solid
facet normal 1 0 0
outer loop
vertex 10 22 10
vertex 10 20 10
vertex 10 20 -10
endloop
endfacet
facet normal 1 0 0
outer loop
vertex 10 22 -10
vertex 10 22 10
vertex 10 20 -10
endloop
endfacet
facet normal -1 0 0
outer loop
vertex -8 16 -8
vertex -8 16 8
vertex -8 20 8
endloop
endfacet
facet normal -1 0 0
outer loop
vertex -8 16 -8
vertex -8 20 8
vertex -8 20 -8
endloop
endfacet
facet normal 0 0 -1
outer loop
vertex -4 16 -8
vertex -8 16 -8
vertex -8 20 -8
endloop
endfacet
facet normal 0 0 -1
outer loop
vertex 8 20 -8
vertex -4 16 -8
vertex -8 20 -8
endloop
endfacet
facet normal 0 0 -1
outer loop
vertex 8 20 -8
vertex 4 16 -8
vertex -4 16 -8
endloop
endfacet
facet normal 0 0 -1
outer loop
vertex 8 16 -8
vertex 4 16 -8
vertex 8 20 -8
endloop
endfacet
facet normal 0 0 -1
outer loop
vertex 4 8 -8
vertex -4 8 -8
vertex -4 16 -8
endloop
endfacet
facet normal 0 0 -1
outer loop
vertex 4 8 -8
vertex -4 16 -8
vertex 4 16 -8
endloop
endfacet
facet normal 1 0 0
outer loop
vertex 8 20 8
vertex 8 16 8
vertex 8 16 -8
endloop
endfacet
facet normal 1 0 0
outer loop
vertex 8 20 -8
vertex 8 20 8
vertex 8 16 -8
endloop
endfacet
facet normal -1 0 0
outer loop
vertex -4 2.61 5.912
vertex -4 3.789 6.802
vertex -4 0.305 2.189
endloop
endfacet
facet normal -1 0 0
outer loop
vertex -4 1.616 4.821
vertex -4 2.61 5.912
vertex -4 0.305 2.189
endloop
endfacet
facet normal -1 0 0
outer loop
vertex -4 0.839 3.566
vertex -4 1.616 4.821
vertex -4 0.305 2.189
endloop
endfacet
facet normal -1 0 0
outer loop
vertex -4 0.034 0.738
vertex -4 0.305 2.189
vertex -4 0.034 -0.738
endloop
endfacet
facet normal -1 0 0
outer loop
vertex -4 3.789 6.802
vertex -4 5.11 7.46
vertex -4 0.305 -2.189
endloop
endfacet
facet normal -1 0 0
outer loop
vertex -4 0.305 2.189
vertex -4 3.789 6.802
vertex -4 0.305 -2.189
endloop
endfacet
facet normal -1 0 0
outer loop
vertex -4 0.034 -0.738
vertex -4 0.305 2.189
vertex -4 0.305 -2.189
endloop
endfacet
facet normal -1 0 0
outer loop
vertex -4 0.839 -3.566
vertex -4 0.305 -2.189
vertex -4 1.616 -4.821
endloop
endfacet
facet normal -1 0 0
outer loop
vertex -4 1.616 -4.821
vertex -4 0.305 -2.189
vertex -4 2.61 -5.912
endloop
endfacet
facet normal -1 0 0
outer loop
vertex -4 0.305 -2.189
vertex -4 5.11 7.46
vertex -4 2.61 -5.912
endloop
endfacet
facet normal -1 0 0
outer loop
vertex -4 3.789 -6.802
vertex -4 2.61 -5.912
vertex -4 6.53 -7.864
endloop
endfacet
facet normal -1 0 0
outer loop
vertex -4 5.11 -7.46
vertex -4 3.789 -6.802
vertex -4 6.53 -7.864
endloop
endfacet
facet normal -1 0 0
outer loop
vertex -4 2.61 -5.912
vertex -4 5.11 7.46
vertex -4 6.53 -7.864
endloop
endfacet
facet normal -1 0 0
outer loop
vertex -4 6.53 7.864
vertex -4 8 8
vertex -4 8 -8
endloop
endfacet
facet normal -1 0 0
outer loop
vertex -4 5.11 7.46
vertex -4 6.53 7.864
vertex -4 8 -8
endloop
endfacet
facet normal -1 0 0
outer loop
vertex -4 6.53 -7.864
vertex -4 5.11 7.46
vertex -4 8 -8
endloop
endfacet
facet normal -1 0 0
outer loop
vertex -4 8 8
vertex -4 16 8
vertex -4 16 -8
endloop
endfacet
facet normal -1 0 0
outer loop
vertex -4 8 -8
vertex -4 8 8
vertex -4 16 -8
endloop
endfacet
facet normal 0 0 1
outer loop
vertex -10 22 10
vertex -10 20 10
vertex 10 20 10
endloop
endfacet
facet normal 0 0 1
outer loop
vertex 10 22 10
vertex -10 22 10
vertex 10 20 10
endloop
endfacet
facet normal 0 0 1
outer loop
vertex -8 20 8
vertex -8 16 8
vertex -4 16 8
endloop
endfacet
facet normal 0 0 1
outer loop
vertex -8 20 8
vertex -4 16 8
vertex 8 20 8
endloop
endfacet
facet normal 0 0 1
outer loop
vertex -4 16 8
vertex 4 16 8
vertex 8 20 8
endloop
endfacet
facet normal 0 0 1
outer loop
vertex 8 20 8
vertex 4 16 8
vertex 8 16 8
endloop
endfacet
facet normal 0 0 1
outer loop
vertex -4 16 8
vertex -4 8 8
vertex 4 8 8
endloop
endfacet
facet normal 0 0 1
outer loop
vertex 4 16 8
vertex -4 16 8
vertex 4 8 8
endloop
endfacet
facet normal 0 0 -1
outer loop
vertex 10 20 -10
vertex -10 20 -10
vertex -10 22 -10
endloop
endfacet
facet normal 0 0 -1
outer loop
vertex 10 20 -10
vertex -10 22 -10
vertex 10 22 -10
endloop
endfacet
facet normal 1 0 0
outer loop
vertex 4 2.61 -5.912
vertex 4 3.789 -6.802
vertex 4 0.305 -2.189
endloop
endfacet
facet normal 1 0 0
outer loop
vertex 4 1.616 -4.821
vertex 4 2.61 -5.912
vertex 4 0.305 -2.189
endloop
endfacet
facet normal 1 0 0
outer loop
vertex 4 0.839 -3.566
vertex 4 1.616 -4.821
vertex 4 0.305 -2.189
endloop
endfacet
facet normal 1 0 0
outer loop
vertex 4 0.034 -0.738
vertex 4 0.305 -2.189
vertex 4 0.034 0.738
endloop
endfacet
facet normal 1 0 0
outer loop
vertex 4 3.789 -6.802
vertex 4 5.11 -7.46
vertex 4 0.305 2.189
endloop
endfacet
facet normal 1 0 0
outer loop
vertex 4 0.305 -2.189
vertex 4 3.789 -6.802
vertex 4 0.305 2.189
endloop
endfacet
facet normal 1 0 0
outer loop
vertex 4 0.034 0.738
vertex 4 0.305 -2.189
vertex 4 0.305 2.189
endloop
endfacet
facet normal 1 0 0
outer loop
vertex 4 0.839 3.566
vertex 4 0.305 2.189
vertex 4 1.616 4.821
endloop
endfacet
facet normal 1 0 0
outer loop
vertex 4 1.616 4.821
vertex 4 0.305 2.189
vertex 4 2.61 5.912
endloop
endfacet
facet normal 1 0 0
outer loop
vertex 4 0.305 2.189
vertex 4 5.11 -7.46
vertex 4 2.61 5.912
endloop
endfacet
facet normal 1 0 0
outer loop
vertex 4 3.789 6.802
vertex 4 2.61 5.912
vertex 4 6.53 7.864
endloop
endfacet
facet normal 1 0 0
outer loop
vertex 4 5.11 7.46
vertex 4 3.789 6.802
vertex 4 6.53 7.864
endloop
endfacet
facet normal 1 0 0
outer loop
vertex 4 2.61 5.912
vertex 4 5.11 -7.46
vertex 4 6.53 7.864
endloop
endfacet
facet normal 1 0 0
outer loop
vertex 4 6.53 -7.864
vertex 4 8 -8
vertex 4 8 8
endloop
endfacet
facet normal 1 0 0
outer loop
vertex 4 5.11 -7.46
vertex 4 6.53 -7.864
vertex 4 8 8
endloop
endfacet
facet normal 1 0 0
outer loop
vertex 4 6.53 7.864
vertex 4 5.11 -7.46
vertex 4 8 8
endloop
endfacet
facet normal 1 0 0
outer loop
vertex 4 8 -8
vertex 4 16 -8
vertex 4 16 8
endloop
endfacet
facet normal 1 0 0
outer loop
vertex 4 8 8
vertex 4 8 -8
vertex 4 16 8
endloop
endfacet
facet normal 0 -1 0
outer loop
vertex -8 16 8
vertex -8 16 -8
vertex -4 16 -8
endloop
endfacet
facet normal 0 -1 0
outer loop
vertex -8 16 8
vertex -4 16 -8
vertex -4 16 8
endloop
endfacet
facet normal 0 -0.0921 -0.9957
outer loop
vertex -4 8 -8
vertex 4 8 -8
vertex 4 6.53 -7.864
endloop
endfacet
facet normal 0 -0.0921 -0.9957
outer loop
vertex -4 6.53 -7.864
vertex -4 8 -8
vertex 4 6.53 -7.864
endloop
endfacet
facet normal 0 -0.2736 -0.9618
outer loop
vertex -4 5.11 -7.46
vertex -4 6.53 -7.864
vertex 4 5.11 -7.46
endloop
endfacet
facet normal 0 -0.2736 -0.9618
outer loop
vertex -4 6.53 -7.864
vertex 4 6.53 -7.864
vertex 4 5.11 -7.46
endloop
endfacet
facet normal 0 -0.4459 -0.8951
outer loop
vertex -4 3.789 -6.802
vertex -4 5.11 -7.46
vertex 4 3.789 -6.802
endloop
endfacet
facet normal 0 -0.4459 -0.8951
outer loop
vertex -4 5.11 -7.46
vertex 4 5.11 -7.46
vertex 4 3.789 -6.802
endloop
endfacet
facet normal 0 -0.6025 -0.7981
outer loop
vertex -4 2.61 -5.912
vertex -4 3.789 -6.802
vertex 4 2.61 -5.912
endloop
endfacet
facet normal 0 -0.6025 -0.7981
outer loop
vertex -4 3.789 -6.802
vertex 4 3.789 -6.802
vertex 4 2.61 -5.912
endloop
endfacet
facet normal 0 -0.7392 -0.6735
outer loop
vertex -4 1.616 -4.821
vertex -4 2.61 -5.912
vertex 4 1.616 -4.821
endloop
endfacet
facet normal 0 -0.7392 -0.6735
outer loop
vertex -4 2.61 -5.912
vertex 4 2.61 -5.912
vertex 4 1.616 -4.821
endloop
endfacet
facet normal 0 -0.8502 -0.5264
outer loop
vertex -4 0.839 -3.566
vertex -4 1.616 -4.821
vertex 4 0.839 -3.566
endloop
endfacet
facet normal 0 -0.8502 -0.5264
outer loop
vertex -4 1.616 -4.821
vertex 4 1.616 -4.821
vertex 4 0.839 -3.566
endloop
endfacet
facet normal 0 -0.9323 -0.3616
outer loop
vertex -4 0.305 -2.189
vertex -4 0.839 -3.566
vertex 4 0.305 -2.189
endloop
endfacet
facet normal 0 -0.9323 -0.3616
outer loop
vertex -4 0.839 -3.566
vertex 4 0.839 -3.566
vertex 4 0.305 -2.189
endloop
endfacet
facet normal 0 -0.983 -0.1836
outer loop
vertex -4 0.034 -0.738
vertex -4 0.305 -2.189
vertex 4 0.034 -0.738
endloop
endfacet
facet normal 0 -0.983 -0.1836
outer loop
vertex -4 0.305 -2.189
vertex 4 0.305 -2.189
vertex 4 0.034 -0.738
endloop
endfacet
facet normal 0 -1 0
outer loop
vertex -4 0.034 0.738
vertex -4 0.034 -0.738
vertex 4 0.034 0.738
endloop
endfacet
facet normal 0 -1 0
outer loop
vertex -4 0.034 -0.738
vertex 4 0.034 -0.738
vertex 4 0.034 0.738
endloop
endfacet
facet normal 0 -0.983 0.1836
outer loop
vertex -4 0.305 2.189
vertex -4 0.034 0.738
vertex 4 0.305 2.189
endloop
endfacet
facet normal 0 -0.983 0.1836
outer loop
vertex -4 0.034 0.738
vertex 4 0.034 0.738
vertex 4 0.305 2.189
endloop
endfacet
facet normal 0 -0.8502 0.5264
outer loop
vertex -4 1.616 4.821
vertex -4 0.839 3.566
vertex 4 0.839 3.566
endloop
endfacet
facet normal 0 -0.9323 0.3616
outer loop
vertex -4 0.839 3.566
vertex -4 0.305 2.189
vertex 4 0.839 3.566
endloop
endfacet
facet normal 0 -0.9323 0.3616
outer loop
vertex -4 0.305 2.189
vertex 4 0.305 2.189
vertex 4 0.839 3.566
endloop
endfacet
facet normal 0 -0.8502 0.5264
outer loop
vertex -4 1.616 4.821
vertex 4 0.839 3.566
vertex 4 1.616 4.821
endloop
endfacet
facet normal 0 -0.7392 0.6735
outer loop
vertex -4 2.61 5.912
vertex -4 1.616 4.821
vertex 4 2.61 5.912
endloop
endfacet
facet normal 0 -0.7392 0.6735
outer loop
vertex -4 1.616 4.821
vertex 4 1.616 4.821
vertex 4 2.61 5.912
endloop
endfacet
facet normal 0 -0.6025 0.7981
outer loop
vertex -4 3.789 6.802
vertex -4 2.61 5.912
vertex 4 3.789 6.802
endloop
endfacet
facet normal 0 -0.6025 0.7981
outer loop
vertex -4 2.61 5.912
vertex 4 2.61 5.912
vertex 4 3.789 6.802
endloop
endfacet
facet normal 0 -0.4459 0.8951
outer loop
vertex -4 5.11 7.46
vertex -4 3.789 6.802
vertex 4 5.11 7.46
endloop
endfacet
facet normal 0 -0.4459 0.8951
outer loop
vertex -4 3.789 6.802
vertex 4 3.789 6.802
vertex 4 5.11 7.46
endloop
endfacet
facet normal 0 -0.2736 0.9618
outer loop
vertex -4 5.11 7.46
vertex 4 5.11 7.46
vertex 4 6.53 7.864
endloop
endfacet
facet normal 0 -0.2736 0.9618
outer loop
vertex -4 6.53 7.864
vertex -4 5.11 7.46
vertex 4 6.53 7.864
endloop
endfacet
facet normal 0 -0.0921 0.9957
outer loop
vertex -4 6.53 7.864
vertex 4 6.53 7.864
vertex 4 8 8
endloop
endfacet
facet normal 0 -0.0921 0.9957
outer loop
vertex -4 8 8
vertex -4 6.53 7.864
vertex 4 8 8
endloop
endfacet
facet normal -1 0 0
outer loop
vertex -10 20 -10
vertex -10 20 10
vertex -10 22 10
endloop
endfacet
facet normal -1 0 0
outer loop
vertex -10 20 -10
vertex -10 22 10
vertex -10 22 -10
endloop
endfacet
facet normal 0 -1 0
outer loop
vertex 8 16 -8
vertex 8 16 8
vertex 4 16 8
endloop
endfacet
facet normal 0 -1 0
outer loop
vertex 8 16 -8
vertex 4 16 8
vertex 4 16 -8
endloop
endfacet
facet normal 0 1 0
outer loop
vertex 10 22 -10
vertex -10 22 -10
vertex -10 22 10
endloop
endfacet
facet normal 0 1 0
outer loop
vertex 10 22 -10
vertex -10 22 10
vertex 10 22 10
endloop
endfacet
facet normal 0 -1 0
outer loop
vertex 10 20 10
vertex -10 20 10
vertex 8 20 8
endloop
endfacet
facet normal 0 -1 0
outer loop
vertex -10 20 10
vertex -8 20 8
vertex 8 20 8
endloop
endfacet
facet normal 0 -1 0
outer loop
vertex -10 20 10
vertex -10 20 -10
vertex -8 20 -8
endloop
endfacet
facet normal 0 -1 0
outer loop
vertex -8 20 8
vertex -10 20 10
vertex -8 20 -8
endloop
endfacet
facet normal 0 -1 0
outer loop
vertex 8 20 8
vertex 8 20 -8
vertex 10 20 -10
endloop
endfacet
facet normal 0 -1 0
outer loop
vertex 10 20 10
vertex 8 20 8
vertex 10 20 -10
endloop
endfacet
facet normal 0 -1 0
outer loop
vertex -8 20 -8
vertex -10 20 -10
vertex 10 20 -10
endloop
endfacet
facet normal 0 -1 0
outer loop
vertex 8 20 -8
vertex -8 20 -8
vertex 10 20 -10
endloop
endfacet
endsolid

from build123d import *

# Parameters (mm, degrees)
SKETCH_1_W          = 16
SKETCH_1_H          = 16
EXTRUDE_1_DEPTH     = 20
CUT_EXTRUDE_1_DEPTH = 40
CUT_EXTRUDE_2_DEPTH = 4
CUT_EXTRUDE_3_DEPTH = 4
SKETCH_6_W          = 20
SKETCH_6_H          = 20
EXTRUDE_2_DEPTH     = 2


with BuildPart() as part:
    # 草图1 → 凸台-拉伸1 (new body)
    with BuildSketch(Plane(origin=(0, 0, 0), x_dir=(1, 0, 0), z_dir=(0, 1, 0))):
        Rectangle(SKETCH_1_W, SKETCH_1_H)
    extrude(amount=EXTRUDE_1_DEPTH)

    # 草图2 → 切除-拉伸1 (cut)
    with BuildSketch(Plane(origin=(8, 0, 0), x_dir=(0, 0, -1), z_dir=(1, 0, 0))):
        with BuildLine():
            Line((-8, 8), (-8, -6.748551072))
            Line((-8, -6.748551072), (8, -6.748551072))
            Line((8, -6.748551072), (8, 8))
            ThreePointArc((8, 8), (0, 0), (-8, 8))
        make_face()
    extrude(amount=-CUT_EXTRUDE_1_DEPTH, mode=Mode.SUBTRACT)

    # 草图4 → 切除-拉伸2 (cut)
    with BuildSketch(Plane.ZY.offset(8)):
        with BuildLine():
            Line((-8, 8), (-8, 16))
            Line((-8, 16), (8, 16))
            Line((8, 16), (8, 8))
            ThreePointArc((8, 8), (0, 0), (-8, 8))
        make_face()
    extrude(amount=-CUT_EXTRUDE_2_DEPTH, mode=Mode.SUBTRACT)

    # 草图5 → 切除-拉伸3 (cut)
    with BuildSketch(Plane(origin=(8, 0, 0), x_dir=(0, 0, -1), z_dir=(1, 0, 0))):
        with BuildLine():
            Line((-8, 8), (-8, 16))
            Line((-8, 16), (8, 16))
            Line((8, 16), (8, 8))
            ThreePointArc((8, 8), (0, 0), (-8, 8))
        make_face()
    extrude(amount=-CUT_EXTRUDE_3_DEPTH, mode=Mode.SUBTRACT)

    # 草图6 → 凸台-拉伸2 (add)
    with BuildSketch(Plane(origin=(0, 20, 0), x_dir=(1, 0, 0), z_dir=(0, 1, 0))):
        Rectangle(SKETCH_6_W, SKETCH_6_H)
    extrude(amount=EXTRUDE_2_DEPTH)


solid = part.part
